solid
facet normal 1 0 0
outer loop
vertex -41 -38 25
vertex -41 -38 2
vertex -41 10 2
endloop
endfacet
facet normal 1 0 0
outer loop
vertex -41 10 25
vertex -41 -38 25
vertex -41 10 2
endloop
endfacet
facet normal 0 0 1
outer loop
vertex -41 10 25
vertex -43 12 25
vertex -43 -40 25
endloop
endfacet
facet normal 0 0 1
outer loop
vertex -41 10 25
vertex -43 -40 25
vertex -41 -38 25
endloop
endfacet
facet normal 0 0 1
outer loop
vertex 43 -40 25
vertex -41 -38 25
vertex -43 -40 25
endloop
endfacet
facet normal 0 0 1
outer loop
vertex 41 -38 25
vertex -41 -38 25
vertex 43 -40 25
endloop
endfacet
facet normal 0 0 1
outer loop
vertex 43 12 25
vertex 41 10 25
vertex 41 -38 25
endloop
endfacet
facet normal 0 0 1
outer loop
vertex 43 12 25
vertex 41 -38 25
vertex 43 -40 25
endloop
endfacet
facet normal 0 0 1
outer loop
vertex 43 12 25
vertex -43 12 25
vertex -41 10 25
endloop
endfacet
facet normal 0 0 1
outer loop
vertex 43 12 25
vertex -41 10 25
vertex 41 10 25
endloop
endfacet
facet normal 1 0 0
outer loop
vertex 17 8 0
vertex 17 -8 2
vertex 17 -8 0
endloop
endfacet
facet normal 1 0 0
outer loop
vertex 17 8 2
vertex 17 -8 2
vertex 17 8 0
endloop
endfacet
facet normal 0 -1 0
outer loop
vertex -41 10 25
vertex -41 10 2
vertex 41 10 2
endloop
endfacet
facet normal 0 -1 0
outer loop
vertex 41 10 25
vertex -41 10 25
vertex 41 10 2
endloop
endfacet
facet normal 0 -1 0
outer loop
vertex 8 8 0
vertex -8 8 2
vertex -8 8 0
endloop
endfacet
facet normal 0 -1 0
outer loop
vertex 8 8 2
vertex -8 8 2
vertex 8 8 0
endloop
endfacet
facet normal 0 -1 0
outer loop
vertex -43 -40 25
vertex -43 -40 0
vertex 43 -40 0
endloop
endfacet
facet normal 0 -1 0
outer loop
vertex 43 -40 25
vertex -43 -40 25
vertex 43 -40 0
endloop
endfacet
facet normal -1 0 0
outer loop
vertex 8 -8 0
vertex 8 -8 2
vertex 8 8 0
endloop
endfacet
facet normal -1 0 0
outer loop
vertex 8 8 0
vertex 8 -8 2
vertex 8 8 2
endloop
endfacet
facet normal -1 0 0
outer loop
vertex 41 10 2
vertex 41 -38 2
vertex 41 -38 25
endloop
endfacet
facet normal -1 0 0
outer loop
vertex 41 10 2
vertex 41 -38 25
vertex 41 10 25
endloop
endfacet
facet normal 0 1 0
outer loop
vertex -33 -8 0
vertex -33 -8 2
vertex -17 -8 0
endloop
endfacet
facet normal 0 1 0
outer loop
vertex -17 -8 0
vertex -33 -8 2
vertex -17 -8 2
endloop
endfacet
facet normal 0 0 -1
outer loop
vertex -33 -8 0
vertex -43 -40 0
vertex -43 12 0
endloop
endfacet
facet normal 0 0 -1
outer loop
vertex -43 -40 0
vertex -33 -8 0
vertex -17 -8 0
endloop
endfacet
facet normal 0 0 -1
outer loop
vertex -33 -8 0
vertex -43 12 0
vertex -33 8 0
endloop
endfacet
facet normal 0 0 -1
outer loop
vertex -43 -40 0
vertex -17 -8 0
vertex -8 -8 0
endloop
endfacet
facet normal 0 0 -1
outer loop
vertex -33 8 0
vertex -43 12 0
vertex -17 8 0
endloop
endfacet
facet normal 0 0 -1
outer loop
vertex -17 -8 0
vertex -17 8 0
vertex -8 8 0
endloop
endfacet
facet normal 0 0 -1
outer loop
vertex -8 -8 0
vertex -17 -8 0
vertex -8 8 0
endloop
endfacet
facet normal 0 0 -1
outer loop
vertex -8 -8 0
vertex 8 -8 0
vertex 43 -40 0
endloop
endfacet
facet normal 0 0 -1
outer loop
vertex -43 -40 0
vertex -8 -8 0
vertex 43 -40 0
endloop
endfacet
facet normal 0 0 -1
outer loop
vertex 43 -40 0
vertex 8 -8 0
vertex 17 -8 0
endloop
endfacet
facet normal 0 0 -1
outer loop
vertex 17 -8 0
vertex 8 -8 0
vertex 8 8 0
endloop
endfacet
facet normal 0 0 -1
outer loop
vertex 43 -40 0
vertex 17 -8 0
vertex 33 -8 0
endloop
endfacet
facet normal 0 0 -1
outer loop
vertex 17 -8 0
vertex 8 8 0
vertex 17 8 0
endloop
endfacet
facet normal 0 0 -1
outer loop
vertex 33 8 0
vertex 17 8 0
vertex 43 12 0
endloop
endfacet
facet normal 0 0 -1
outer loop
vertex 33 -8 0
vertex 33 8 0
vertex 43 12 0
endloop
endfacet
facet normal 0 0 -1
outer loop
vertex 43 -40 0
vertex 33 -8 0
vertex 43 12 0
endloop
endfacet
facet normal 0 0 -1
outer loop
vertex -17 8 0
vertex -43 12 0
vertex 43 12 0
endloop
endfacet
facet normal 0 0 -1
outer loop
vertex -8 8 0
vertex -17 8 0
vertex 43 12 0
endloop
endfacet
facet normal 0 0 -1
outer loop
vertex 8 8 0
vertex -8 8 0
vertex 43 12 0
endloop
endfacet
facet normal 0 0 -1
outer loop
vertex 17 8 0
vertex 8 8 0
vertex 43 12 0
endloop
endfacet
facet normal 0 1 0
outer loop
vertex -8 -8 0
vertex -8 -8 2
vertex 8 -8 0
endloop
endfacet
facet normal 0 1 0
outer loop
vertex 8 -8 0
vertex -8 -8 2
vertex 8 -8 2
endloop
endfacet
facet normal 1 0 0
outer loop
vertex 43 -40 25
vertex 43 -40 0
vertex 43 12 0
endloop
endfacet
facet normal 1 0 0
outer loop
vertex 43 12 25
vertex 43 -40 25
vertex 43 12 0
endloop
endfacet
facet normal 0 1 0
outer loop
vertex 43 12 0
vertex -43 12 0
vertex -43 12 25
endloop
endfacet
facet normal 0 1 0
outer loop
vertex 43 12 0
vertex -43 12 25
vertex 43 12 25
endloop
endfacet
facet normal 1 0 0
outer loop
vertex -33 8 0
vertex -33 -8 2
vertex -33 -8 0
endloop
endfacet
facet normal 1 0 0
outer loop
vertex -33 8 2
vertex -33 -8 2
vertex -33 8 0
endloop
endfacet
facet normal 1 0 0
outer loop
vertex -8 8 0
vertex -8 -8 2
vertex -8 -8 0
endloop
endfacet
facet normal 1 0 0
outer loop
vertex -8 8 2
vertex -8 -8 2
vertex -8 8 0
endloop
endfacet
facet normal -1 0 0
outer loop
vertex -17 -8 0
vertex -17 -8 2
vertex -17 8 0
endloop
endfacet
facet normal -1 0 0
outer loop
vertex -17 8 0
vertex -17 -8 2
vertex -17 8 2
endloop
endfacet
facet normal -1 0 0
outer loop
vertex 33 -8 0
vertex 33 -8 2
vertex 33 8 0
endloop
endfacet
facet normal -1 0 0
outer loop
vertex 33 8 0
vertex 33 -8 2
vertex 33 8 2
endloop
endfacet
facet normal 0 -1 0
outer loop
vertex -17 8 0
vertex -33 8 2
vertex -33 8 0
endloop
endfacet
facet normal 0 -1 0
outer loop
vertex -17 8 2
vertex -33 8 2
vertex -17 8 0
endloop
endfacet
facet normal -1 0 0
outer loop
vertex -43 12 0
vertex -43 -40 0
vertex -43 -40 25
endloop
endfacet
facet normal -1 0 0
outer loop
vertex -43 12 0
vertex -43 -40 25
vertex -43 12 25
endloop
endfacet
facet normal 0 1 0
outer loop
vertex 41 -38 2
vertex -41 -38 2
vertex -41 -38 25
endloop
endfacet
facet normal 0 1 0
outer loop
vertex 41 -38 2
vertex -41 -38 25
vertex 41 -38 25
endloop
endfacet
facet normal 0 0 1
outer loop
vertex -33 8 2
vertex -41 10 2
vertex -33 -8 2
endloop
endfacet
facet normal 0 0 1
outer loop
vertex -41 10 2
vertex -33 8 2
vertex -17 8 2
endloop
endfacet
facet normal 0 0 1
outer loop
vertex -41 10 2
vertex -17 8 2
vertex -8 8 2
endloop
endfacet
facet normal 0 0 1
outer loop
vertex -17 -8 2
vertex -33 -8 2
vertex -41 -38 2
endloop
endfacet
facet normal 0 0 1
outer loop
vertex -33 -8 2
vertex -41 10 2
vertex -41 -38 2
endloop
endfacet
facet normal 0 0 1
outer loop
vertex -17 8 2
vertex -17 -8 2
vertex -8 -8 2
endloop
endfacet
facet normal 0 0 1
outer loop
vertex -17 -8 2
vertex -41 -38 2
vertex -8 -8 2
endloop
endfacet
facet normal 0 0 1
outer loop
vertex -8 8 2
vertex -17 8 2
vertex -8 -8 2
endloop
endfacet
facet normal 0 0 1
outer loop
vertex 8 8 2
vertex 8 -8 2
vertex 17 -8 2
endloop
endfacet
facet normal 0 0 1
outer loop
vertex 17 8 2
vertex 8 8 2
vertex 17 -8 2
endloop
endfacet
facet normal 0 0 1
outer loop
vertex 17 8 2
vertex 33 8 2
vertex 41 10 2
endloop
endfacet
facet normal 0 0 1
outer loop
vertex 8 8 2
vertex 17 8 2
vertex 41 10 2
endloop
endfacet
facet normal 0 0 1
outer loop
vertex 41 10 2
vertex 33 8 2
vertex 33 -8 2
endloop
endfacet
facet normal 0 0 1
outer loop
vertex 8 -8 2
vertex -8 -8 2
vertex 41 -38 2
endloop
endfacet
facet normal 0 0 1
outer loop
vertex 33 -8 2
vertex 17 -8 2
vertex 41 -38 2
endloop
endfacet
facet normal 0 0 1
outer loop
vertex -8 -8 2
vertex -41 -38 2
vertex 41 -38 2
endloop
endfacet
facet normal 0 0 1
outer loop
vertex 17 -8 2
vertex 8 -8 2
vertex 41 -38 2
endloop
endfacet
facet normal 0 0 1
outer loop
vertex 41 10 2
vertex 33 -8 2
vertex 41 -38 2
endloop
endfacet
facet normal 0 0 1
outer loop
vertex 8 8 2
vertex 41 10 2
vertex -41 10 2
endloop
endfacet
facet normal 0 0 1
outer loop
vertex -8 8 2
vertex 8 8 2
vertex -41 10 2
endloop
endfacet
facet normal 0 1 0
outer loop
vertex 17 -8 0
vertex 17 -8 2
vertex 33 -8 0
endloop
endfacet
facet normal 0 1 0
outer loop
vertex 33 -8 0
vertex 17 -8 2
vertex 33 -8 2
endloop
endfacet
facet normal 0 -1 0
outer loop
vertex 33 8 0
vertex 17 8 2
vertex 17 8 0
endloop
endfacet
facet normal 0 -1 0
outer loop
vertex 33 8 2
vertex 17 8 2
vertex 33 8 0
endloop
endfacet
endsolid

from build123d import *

# Parameters (mm, degrees)
SKETCH_W        = 86
SKETCH_H        = 52
SKETCH_W_2      = 82
SKETCH_H_2      = 48
PAD_DEPTH       = 25
SKETCH005_W     = 86
SKETCH005_H     = 52
PAD003002_DEPTH = 2
SKETCH006_W     = 16
SKETCH006_H     = 16
POCKET_DEPTH    = 2.001


with BuildPart() as part:
    # Sketch → Pad (new body)
    with BuildSketch(Plane.XY):
        with Locations((0, -14)):
            Rectangle(SKETCH_W, SKETCH_H)
        with Locations((0, -14)):
            Rectangle(SKETCH_W_2, SKETCH_H_2, mode=Mode.SUBTRACT)
    extrude(amount=PAD_DEPTH)

    # Sketch005 → Pad003002 (new body)
    with BuildSketch(Plane(origin=(0, 0, 0), x_dir=(1, 0, 0), z_dir=(0, 0, -1))):
        with Locations((0, 14)):
            Rectangle(SKETCH005_W, SKETCH005_H)
    extrude(amount=-PAD003002_DEPTH)

    # Sketch006 → Pocket (cut, through all)
    with BuildSketch(Plane.XY.offset(2)):
        Rectangle(SKETCH006_W, SKETCH006_H)
        with Locations((-25, 0)):
            Rectangle(SKETCH006_W, SKETCH006_H)
        with Locations((25, 0)):
            Rectangle(SKETCH006_W, SKETCH006_H)
    extrude(amount=-POCKET_DEPTH, mode=Mode.SUBTRACT)


solid = part.part
